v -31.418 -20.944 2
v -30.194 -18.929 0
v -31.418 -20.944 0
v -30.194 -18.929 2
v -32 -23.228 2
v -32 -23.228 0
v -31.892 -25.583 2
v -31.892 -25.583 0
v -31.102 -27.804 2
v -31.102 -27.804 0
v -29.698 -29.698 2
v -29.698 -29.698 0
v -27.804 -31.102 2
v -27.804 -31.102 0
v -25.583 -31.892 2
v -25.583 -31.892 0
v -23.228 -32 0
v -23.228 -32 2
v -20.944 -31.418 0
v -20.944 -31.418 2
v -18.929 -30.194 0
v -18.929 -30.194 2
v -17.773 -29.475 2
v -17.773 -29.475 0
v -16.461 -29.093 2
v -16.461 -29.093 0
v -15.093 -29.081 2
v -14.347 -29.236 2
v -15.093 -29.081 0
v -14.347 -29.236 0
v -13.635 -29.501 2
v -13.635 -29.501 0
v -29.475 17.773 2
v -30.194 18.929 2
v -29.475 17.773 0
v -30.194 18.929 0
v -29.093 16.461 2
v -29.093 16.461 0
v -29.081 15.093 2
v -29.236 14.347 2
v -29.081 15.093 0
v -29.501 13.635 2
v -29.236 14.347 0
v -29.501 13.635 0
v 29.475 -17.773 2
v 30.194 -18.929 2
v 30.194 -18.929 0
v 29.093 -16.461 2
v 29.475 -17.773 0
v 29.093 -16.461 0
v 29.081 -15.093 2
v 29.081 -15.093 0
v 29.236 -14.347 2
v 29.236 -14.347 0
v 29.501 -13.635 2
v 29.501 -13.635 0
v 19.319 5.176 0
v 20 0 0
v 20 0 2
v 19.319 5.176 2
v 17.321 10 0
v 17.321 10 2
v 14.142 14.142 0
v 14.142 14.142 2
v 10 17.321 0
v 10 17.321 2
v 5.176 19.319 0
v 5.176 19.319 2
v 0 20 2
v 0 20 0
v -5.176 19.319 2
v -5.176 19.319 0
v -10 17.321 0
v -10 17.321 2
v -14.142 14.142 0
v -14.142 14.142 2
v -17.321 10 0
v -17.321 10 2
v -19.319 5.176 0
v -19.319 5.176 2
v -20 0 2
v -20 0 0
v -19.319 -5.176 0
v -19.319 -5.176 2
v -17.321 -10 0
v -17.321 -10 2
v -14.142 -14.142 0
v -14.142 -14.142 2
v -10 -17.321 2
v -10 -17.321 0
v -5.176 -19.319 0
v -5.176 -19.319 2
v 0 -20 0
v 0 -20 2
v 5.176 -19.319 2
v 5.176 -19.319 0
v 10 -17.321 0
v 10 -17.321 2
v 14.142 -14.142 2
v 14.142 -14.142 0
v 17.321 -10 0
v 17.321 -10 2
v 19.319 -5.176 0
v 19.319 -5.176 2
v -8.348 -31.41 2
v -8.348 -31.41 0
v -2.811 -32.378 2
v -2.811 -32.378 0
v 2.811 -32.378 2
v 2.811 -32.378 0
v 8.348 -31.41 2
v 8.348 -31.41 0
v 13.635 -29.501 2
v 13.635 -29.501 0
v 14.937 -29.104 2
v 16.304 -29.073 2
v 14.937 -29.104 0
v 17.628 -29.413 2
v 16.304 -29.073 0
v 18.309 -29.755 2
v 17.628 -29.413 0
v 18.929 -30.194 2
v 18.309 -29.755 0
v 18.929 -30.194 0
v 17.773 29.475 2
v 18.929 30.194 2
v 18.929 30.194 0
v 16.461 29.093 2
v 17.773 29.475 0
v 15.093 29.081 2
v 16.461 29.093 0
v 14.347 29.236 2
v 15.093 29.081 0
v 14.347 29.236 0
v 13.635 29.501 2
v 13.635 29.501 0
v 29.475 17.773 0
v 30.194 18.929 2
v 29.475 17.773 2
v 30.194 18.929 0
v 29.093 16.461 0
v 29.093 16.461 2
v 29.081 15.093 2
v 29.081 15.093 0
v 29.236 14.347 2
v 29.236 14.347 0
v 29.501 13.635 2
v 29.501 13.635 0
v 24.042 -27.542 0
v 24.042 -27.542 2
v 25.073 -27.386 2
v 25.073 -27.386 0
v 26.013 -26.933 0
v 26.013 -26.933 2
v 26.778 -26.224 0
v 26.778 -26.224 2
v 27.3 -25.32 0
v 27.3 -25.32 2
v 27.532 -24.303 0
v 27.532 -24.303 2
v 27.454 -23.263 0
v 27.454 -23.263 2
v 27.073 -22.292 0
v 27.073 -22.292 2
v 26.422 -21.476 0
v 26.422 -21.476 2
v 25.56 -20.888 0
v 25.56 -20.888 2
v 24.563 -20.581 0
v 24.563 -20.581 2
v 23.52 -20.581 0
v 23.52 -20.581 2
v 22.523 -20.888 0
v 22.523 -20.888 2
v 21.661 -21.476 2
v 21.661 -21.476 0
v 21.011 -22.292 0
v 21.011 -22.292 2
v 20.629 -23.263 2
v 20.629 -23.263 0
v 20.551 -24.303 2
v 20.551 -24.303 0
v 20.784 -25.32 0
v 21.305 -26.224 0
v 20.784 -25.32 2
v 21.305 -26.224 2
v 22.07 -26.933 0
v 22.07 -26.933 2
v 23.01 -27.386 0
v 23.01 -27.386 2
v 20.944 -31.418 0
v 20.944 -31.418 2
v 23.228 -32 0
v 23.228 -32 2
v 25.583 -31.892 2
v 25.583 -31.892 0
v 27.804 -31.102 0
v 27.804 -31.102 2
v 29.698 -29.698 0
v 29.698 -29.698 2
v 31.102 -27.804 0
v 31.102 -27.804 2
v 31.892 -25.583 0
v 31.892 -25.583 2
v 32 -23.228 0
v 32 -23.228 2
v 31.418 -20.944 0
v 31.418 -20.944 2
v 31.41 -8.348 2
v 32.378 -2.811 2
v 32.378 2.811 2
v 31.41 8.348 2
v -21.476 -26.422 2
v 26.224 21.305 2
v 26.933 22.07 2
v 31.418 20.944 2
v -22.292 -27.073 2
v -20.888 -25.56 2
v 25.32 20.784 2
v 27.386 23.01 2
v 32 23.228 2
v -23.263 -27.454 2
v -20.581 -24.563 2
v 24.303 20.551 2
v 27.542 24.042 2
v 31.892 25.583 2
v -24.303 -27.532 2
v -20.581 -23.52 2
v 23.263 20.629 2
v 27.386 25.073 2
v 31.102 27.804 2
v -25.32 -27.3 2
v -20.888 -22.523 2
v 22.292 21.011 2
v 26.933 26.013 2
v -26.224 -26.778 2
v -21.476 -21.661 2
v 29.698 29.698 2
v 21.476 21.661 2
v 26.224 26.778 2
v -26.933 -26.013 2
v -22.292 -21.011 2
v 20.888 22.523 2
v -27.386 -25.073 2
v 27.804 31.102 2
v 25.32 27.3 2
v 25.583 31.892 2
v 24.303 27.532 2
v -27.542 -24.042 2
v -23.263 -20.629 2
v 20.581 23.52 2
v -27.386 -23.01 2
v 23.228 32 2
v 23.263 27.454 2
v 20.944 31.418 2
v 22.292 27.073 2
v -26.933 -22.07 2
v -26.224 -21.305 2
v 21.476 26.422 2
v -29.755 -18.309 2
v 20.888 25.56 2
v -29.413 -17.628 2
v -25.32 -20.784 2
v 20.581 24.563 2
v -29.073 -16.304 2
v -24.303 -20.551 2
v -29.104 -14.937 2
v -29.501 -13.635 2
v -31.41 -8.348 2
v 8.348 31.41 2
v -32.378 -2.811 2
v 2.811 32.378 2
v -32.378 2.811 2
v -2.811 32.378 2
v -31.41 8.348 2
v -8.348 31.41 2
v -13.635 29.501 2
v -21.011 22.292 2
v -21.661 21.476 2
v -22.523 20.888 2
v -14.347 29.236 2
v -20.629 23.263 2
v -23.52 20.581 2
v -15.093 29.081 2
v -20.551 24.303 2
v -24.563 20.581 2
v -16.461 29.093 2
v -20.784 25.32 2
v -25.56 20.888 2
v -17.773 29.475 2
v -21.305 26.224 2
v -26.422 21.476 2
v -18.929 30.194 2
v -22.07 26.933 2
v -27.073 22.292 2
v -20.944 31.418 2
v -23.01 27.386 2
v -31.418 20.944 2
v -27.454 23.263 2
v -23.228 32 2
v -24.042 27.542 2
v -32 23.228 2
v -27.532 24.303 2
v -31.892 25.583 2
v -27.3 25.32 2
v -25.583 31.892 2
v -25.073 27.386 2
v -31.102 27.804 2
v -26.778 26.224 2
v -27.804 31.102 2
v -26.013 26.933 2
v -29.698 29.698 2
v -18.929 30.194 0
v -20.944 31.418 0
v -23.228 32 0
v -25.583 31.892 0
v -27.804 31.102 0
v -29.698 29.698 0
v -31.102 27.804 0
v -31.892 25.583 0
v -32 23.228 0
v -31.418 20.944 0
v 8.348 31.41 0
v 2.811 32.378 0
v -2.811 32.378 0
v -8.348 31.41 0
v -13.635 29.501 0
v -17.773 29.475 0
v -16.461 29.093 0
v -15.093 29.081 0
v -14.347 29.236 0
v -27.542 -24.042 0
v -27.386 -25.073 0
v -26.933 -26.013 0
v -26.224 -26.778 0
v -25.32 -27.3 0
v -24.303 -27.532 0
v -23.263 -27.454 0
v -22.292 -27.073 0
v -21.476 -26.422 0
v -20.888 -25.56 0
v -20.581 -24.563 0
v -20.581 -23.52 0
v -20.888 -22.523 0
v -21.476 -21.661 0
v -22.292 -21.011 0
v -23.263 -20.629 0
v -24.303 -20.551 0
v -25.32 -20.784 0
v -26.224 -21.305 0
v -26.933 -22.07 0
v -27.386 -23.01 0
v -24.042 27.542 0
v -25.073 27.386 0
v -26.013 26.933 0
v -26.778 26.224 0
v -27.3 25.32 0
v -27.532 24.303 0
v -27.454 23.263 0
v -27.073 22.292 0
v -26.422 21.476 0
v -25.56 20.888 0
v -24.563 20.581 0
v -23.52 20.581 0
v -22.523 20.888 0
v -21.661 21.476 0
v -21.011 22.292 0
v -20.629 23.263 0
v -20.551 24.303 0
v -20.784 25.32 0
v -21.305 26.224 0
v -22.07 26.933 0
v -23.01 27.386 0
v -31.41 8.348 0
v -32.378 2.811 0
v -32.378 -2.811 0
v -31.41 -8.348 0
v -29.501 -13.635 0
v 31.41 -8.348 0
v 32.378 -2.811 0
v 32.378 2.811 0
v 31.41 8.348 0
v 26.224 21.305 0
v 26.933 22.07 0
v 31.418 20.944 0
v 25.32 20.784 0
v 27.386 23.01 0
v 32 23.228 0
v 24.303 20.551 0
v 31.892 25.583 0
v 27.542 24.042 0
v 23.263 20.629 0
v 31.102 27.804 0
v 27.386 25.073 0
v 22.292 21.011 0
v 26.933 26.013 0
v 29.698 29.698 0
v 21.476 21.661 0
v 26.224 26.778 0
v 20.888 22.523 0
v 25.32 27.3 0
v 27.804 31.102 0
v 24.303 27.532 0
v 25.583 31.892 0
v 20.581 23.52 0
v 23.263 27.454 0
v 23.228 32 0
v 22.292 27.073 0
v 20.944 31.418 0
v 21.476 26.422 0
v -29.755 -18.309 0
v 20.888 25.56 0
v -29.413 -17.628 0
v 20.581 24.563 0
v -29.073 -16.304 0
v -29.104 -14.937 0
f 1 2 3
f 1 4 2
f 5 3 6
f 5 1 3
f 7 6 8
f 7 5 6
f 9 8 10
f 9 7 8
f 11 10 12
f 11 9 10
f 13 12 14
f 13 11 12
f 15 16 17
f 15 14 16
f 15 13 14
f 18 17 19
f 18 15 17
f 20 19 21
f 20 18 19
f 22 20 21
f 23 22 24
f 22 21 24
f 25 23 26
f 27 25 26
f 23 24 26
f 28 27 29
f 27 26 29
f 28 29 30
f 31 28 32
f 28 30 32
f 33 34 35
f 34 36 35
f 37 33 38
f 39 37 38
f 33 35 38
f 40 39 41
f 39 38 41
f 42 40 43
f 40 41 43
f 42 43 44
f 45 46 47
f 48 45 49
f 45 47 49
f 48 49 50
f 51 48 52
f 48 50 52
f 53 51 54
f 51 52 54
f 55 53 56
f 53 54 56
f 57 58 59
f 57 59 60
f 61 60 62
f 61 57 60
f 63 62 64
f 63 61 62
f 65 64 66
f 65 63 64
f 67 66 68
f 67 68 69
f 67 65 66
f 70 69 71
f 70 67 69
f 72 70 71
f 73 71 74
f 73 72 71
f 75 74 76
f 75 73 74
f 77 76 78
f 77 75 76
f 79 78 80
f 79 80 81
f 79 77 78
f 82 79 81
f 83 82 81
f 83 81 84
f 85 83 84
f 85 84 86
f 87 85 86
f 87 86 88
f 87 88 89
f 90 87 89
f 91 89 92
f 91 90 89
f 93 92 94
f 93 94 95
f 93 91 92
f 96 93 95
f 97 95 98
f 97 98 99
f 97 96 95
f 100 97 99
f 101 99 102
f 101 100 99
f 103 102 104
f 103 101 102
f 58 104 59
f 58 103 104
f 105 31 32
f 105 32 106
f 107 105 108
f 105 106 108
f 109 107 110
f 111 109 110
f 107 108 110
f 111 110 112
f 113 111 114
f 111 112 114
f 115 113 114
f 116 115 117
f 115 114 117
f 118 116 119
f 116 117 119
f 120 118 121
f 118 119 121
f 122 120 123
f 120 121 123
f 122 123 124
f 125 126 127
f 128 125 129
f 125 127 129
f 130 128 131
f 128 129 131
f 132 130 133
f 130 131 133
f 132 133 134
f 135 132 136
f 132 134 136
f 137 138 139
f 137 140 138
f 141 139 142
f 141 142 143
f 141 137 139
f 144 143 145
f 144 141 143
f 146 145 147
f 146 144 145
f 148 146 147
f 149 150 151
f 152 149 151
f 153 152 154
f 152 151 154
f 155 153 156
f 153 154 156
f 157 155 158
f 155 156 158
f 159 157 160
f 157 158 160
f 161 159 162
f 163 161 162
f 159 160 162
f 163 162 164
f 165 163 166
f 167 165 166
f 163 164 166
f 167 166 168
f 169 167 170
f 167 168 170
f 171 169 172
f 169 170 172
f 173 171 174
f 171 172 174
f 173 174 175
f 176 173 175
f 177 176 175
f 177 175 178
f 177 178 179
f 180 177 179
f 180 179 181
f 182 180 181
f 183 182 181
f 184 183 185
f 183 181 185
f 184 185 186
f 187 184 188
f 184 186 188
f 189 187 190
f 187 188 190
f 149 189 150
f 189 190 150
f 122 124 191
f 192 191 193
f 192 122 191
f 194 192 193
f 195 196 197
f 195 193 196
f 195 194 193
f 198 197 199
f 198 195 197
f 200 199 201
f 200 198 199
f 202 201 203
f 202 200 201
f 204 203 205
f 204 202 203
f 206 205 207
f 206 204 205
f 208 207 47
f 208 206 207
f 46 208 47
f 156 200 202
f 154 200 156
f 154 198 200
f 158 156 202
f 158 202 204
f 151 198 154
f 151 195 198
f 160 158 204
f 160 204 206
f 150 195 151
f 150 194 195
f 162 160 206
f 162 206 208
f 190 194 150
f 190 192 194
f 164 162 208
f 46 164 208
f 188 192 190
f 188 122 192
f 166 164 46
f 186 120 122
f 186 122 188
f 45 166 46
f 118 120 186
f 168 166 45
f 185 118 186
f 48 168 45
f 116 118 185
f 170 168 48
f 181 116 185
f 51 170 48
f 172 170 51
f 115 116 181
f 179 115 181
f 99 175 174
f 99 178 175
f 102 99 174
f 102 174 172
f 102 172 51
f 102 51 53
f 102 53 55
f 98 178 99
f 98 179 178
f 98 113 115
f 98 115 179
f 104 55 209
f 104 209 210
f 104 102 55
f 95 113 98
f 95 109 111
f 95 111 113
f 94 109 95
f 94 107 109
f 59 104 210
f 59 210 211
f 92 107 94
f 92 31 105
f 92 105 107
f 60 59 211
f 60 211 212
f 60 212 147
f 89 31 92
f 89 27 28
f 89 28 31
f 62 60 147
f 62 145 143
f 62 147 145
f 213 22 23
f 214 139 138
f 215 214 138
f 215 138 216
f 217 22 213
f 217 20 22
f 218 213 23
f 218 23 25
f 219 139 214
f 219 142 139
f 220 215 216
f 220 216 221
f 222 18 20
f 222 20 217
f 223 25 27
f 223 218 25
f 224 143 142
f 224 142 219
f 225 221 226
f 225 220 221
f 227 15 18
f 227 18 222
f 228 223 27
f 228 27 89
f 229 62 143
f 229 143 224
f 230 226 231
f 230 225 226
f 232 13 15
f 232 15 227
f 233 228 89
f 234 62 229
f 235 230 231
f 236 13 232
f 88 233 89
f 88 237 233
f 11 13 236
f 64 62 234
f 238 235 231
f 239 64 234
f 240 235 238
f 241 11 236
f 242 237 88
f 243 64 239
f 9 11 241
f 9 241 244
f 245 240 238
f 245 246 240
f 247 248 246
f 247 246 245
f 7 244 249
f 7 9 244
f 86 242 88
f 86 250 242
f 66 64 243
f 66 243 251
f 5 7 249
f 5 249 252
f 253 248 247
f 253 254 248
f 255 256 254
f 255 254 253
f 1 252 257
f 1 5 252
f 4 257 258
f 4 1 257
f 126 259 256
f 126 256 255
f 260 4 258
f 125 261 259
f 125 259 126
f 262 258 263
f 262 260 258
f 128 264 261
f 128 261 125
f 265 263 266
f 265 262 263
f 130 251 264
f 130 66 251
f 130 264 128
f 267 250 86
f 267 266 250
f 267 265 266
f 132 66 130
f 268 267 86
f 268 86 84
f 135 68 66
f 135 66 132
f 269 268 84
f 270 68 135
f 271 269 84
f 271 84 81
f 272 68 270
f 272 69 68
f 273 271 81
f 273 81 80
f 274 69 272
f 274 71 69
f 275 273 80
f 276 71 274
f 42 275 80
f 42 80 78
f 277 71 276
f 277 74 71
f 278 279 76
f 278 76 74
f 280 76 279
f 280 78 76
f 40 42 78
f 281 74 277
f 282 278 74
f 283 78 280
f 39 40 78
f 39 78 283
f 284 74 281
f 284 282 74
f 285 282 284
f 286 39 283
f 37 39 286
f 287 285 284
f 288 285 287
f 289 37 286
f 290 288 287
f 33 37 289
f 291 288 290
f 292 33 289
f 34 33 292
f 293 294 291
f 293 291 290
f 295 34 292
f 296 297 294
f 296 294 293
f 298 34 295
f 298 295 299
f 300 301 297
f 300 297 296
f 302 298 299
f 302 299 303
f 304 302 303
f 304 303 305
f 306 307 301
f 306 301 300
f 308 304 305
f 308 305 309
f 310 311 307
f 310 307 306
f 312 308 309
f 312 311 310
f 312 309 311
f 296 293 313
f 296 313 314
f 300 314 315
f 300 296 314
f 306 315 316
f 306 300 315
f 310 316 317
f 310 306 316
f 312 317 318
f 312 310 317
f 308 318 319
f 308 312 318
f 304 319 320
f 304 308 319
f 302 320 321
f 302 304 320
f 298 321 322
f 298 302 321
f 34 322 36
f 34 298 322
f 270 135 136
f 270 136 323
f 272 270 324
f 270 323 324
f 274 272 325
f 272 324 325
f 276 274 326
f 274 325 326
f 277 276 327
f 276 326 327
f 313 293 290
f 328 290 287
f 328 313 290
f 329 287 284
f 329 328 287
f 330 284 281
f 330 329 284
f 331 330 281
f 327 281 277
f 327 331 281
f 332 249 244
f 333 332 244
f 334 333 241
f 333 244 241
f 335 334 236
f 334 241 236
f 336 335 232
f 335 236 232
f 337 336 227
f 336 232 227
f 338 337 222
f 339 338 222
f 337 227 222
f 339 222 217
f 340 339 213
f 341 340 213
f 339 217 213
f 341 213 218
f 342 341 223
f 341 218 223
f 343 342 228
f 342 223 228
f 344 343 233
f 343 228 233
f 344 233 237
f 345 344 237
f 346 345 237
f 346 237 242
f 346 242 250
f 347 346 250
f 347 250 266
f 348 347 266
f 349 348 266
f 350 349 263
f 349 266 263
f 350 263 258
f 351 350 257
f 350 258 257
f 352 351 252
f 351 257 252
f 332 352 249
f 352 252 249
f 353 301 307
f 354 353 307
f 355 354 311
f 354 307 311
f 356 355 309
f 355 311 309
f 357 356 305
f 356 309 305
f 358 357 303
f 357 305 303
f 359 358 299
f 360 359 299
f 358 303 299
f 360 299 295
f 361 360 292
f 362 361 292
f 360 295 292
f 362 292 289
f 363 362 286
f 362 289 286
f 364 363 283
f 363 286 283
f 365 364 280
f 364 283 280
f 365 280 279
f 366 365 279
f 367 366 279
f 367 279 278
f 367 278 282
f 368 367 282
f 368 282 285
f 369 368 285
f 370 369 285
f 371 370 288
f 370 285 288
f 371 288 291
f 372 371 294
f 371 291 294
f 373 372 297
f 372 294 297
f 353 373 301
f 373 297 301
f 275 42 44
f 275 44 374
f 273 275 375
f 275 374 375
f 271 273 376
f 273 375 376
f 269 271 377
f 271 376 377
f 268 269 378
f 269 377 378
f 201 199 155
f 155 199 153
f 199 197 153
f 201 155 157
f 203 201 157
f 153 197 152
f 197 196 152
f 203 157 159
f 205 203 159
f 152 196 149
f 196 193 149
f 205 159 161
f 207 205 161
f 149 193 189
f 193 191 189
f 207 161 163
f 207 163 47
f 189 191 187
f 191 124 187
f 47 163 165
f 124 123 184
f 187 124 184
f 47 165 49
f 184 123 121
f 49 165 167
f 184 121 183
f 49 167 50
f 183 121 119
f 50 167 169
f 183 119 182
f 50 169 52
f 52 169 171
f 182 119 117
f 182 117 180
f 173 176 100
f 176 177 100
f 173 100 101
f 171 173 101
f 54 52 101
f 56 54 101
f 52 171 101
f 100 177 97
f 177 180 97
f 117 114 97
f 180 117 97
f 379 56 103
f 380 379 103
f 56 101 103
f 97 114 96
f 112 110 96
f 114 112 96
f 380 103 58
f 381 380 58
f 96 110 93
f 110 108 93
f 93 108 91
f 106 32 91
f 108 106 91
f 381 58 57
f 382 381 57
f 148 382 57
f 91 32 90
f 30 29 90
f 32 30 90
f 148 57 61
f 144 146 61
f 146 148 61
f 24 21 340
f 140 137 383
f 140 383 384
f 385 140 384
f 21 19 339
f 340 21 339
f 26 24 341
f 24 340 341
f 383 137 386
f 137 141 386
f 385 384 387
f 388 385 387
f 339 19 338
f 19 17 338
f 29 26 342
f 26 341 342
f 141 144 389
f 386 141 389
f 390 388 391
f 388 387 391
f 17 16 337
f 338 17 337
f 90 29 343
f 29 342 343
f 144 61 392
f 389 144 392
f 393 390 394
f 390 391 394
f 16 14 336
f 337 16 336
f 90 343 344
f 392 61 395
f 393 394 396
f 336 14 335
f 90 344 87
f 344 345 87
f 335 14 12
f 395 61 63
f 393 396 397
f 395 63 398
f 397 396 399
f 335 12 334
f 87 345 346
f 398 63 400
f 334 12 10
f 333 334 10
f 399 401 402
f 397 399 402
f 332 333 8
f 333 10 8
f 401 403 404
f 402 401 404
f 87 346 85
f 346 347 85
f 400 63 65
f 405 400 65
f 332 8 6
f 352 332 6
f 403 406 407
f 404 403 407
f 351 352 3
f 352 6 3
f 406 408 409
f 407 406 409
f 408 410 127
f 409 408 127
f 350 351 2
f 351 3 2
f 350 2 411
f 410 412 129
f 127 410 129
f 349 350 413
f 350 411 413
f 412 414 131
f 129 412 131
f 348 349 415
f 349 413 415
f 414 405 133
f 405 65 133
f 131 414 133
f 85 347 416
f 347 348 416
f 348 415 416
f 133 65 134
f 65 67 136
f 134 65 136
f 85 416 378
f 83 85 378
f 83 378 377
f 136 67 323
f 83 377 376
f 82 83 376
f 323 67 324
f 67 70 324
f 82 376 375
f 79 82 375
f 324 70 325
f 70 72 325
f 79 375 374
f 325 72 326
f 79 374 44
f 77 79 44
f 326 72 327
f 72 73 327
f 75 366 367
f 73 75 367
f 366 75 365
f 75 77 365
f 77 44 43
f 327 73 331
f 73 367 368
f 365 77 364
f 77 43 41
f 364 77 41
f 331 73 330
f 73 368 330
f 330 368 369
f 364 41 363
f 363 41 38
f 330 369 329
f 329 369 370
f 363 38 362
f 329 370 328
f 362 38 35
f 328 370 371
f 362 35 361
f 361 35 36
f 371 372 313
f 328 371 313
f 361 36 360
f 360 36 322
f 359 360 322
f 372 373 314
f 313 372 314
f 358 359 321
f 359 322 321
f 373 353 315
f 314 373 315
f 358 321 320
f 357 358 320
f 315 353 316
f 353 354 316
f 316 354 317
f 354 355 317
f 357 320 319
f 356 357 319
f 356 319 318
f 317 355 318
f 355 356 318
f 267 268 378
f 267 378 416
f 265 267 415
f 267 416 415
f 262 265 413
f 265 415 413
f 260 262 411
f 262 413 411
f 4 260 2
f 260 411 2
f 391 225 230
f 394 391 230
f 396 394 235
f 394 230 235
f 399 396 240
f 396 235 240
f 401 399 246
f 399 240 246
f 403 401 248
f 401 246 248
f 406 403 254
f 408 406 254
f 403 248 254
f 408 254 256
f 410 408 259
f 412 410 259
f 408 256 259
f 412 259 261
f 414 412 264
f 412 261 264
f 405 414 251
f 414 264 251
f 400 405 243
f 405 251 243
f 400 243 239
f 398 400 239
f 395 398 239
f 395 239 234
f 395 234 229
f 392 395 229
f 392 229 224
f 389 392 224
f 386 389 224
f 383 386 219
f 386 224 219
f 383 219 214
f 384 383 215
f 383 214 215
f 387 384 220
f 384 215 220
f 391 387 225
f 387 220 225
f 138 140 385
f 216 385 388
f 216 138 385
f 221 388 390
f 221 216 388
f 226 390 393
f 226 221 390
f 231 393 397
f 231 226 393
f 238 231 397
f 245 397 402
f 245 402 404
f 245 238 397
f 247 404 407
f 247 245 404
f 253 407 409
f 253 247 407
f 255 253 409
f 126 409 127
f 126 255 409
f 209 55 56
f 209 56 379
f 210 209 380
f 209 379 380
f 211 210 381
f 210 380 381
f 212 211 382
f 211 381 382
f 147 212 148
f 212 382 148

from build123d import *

# Parameters (mm, degrees)
SKETCH_1_R                       = 32.5
SKETCH_1_R_2                     = 20
EXTRUDE_1_DEPTH                  = 2
SKETCH_2_R                       = 8
EXTRUDE_2_DEPTH                  = 2
SKETCH_3_R                       = 3.5
CUT_EXTRUDE_1_DEPTH              = 2
FILLET_1_R                       = 5
PATTERN_CIRCULAR_1_COUNT         = 4
FILLET_1_OF_PATTERN_CIRCULAR_1_R = 5


with BuildPart() as part:
    # 草图1 → 凸台-拉伸1 (new body)
    with BuildSketch(Plane.XY):
        Circle(SKETCH_1_R)
        Circle(SKETCH_1_R_2, mode=Mode.SUBTRACT)
    extrude(amount=EXTRUDE_1_DEPTH)

    # 草图2 → 凸台-拉伸2 (add)
    with BuildSketch(Plane.XY.offset(2)):
        with Locations((24.04163056, 24.04163056)):
            Circle(SKETCH_2_R)
    extrude_2 = extrude(amount=-EXTRUDE_2_DEPTH)

    # 草图3 → 切除-拉伸1 (cut)
    with BuildSketch(Plane.XY.offset(2)):
        with Locations((24.04163056, 24.04163056)):
            Circle(SKETCH_3_R)
    cut_extrude_1 = extrude(amount=-CUT_EXTRUDE_1_DEPTH, mode=Mode.SUBTRACT)

    # 圆角1
    fillet_1_edges = [part.edges().sort_by_distance(p)[0] for p in [
        (16.944361965, 27.733348113, 1),
        (27.733348113, 16.944361965, 1),
    ]]
    fillet(fillet_1_edges, radius=FILLET_1_R)

    # 阵列(圆周)1: 凸台-拉伸2, 切除-拉伸1 ×4 about axis
    pattern_circular_1_axis = Axis((0, 0, 0), (0, 0, 1))
    add([extrude_2.rotate(pattern_circular_1_axis, i * 360 / PATTERN_CIRCULAR_1_COUNT) for i in range(1, PATTERN_CIRCULAR_1_COUNT)])
    add([cut_extrude_1.rotate(pattern_circular_1_axis, i * 360 / PATTERN_CIRCULAR_1_COUNT) for i in range(1, PATTERN_CIRCULAR_1_COUNT)], mode=Mode.SUBTRACT)

    # 圆角1 of 阵列(圆周)1
    fillet_1_of_pattern_circular_1_edges = [part.edges().sort_by_distance(p)[0] for p in [
        (-27.733348113, 16.944361965, 1),
        (-16.944361965, 27.733348113, 1),
        (-16.944361965, -27.733348113, 1),
        (-27.733348113, -16.944361965, 1),
        (27.733348113, -16.944361965, 1),
        (16.944361965, -27.733348113, 1),
    ]]
    fillet(fillet_1_of_pattern_circular_1_edges, radius=FILLET_1_OF_PATTERN_CIRCULAR_1_R)


solid = part.part
